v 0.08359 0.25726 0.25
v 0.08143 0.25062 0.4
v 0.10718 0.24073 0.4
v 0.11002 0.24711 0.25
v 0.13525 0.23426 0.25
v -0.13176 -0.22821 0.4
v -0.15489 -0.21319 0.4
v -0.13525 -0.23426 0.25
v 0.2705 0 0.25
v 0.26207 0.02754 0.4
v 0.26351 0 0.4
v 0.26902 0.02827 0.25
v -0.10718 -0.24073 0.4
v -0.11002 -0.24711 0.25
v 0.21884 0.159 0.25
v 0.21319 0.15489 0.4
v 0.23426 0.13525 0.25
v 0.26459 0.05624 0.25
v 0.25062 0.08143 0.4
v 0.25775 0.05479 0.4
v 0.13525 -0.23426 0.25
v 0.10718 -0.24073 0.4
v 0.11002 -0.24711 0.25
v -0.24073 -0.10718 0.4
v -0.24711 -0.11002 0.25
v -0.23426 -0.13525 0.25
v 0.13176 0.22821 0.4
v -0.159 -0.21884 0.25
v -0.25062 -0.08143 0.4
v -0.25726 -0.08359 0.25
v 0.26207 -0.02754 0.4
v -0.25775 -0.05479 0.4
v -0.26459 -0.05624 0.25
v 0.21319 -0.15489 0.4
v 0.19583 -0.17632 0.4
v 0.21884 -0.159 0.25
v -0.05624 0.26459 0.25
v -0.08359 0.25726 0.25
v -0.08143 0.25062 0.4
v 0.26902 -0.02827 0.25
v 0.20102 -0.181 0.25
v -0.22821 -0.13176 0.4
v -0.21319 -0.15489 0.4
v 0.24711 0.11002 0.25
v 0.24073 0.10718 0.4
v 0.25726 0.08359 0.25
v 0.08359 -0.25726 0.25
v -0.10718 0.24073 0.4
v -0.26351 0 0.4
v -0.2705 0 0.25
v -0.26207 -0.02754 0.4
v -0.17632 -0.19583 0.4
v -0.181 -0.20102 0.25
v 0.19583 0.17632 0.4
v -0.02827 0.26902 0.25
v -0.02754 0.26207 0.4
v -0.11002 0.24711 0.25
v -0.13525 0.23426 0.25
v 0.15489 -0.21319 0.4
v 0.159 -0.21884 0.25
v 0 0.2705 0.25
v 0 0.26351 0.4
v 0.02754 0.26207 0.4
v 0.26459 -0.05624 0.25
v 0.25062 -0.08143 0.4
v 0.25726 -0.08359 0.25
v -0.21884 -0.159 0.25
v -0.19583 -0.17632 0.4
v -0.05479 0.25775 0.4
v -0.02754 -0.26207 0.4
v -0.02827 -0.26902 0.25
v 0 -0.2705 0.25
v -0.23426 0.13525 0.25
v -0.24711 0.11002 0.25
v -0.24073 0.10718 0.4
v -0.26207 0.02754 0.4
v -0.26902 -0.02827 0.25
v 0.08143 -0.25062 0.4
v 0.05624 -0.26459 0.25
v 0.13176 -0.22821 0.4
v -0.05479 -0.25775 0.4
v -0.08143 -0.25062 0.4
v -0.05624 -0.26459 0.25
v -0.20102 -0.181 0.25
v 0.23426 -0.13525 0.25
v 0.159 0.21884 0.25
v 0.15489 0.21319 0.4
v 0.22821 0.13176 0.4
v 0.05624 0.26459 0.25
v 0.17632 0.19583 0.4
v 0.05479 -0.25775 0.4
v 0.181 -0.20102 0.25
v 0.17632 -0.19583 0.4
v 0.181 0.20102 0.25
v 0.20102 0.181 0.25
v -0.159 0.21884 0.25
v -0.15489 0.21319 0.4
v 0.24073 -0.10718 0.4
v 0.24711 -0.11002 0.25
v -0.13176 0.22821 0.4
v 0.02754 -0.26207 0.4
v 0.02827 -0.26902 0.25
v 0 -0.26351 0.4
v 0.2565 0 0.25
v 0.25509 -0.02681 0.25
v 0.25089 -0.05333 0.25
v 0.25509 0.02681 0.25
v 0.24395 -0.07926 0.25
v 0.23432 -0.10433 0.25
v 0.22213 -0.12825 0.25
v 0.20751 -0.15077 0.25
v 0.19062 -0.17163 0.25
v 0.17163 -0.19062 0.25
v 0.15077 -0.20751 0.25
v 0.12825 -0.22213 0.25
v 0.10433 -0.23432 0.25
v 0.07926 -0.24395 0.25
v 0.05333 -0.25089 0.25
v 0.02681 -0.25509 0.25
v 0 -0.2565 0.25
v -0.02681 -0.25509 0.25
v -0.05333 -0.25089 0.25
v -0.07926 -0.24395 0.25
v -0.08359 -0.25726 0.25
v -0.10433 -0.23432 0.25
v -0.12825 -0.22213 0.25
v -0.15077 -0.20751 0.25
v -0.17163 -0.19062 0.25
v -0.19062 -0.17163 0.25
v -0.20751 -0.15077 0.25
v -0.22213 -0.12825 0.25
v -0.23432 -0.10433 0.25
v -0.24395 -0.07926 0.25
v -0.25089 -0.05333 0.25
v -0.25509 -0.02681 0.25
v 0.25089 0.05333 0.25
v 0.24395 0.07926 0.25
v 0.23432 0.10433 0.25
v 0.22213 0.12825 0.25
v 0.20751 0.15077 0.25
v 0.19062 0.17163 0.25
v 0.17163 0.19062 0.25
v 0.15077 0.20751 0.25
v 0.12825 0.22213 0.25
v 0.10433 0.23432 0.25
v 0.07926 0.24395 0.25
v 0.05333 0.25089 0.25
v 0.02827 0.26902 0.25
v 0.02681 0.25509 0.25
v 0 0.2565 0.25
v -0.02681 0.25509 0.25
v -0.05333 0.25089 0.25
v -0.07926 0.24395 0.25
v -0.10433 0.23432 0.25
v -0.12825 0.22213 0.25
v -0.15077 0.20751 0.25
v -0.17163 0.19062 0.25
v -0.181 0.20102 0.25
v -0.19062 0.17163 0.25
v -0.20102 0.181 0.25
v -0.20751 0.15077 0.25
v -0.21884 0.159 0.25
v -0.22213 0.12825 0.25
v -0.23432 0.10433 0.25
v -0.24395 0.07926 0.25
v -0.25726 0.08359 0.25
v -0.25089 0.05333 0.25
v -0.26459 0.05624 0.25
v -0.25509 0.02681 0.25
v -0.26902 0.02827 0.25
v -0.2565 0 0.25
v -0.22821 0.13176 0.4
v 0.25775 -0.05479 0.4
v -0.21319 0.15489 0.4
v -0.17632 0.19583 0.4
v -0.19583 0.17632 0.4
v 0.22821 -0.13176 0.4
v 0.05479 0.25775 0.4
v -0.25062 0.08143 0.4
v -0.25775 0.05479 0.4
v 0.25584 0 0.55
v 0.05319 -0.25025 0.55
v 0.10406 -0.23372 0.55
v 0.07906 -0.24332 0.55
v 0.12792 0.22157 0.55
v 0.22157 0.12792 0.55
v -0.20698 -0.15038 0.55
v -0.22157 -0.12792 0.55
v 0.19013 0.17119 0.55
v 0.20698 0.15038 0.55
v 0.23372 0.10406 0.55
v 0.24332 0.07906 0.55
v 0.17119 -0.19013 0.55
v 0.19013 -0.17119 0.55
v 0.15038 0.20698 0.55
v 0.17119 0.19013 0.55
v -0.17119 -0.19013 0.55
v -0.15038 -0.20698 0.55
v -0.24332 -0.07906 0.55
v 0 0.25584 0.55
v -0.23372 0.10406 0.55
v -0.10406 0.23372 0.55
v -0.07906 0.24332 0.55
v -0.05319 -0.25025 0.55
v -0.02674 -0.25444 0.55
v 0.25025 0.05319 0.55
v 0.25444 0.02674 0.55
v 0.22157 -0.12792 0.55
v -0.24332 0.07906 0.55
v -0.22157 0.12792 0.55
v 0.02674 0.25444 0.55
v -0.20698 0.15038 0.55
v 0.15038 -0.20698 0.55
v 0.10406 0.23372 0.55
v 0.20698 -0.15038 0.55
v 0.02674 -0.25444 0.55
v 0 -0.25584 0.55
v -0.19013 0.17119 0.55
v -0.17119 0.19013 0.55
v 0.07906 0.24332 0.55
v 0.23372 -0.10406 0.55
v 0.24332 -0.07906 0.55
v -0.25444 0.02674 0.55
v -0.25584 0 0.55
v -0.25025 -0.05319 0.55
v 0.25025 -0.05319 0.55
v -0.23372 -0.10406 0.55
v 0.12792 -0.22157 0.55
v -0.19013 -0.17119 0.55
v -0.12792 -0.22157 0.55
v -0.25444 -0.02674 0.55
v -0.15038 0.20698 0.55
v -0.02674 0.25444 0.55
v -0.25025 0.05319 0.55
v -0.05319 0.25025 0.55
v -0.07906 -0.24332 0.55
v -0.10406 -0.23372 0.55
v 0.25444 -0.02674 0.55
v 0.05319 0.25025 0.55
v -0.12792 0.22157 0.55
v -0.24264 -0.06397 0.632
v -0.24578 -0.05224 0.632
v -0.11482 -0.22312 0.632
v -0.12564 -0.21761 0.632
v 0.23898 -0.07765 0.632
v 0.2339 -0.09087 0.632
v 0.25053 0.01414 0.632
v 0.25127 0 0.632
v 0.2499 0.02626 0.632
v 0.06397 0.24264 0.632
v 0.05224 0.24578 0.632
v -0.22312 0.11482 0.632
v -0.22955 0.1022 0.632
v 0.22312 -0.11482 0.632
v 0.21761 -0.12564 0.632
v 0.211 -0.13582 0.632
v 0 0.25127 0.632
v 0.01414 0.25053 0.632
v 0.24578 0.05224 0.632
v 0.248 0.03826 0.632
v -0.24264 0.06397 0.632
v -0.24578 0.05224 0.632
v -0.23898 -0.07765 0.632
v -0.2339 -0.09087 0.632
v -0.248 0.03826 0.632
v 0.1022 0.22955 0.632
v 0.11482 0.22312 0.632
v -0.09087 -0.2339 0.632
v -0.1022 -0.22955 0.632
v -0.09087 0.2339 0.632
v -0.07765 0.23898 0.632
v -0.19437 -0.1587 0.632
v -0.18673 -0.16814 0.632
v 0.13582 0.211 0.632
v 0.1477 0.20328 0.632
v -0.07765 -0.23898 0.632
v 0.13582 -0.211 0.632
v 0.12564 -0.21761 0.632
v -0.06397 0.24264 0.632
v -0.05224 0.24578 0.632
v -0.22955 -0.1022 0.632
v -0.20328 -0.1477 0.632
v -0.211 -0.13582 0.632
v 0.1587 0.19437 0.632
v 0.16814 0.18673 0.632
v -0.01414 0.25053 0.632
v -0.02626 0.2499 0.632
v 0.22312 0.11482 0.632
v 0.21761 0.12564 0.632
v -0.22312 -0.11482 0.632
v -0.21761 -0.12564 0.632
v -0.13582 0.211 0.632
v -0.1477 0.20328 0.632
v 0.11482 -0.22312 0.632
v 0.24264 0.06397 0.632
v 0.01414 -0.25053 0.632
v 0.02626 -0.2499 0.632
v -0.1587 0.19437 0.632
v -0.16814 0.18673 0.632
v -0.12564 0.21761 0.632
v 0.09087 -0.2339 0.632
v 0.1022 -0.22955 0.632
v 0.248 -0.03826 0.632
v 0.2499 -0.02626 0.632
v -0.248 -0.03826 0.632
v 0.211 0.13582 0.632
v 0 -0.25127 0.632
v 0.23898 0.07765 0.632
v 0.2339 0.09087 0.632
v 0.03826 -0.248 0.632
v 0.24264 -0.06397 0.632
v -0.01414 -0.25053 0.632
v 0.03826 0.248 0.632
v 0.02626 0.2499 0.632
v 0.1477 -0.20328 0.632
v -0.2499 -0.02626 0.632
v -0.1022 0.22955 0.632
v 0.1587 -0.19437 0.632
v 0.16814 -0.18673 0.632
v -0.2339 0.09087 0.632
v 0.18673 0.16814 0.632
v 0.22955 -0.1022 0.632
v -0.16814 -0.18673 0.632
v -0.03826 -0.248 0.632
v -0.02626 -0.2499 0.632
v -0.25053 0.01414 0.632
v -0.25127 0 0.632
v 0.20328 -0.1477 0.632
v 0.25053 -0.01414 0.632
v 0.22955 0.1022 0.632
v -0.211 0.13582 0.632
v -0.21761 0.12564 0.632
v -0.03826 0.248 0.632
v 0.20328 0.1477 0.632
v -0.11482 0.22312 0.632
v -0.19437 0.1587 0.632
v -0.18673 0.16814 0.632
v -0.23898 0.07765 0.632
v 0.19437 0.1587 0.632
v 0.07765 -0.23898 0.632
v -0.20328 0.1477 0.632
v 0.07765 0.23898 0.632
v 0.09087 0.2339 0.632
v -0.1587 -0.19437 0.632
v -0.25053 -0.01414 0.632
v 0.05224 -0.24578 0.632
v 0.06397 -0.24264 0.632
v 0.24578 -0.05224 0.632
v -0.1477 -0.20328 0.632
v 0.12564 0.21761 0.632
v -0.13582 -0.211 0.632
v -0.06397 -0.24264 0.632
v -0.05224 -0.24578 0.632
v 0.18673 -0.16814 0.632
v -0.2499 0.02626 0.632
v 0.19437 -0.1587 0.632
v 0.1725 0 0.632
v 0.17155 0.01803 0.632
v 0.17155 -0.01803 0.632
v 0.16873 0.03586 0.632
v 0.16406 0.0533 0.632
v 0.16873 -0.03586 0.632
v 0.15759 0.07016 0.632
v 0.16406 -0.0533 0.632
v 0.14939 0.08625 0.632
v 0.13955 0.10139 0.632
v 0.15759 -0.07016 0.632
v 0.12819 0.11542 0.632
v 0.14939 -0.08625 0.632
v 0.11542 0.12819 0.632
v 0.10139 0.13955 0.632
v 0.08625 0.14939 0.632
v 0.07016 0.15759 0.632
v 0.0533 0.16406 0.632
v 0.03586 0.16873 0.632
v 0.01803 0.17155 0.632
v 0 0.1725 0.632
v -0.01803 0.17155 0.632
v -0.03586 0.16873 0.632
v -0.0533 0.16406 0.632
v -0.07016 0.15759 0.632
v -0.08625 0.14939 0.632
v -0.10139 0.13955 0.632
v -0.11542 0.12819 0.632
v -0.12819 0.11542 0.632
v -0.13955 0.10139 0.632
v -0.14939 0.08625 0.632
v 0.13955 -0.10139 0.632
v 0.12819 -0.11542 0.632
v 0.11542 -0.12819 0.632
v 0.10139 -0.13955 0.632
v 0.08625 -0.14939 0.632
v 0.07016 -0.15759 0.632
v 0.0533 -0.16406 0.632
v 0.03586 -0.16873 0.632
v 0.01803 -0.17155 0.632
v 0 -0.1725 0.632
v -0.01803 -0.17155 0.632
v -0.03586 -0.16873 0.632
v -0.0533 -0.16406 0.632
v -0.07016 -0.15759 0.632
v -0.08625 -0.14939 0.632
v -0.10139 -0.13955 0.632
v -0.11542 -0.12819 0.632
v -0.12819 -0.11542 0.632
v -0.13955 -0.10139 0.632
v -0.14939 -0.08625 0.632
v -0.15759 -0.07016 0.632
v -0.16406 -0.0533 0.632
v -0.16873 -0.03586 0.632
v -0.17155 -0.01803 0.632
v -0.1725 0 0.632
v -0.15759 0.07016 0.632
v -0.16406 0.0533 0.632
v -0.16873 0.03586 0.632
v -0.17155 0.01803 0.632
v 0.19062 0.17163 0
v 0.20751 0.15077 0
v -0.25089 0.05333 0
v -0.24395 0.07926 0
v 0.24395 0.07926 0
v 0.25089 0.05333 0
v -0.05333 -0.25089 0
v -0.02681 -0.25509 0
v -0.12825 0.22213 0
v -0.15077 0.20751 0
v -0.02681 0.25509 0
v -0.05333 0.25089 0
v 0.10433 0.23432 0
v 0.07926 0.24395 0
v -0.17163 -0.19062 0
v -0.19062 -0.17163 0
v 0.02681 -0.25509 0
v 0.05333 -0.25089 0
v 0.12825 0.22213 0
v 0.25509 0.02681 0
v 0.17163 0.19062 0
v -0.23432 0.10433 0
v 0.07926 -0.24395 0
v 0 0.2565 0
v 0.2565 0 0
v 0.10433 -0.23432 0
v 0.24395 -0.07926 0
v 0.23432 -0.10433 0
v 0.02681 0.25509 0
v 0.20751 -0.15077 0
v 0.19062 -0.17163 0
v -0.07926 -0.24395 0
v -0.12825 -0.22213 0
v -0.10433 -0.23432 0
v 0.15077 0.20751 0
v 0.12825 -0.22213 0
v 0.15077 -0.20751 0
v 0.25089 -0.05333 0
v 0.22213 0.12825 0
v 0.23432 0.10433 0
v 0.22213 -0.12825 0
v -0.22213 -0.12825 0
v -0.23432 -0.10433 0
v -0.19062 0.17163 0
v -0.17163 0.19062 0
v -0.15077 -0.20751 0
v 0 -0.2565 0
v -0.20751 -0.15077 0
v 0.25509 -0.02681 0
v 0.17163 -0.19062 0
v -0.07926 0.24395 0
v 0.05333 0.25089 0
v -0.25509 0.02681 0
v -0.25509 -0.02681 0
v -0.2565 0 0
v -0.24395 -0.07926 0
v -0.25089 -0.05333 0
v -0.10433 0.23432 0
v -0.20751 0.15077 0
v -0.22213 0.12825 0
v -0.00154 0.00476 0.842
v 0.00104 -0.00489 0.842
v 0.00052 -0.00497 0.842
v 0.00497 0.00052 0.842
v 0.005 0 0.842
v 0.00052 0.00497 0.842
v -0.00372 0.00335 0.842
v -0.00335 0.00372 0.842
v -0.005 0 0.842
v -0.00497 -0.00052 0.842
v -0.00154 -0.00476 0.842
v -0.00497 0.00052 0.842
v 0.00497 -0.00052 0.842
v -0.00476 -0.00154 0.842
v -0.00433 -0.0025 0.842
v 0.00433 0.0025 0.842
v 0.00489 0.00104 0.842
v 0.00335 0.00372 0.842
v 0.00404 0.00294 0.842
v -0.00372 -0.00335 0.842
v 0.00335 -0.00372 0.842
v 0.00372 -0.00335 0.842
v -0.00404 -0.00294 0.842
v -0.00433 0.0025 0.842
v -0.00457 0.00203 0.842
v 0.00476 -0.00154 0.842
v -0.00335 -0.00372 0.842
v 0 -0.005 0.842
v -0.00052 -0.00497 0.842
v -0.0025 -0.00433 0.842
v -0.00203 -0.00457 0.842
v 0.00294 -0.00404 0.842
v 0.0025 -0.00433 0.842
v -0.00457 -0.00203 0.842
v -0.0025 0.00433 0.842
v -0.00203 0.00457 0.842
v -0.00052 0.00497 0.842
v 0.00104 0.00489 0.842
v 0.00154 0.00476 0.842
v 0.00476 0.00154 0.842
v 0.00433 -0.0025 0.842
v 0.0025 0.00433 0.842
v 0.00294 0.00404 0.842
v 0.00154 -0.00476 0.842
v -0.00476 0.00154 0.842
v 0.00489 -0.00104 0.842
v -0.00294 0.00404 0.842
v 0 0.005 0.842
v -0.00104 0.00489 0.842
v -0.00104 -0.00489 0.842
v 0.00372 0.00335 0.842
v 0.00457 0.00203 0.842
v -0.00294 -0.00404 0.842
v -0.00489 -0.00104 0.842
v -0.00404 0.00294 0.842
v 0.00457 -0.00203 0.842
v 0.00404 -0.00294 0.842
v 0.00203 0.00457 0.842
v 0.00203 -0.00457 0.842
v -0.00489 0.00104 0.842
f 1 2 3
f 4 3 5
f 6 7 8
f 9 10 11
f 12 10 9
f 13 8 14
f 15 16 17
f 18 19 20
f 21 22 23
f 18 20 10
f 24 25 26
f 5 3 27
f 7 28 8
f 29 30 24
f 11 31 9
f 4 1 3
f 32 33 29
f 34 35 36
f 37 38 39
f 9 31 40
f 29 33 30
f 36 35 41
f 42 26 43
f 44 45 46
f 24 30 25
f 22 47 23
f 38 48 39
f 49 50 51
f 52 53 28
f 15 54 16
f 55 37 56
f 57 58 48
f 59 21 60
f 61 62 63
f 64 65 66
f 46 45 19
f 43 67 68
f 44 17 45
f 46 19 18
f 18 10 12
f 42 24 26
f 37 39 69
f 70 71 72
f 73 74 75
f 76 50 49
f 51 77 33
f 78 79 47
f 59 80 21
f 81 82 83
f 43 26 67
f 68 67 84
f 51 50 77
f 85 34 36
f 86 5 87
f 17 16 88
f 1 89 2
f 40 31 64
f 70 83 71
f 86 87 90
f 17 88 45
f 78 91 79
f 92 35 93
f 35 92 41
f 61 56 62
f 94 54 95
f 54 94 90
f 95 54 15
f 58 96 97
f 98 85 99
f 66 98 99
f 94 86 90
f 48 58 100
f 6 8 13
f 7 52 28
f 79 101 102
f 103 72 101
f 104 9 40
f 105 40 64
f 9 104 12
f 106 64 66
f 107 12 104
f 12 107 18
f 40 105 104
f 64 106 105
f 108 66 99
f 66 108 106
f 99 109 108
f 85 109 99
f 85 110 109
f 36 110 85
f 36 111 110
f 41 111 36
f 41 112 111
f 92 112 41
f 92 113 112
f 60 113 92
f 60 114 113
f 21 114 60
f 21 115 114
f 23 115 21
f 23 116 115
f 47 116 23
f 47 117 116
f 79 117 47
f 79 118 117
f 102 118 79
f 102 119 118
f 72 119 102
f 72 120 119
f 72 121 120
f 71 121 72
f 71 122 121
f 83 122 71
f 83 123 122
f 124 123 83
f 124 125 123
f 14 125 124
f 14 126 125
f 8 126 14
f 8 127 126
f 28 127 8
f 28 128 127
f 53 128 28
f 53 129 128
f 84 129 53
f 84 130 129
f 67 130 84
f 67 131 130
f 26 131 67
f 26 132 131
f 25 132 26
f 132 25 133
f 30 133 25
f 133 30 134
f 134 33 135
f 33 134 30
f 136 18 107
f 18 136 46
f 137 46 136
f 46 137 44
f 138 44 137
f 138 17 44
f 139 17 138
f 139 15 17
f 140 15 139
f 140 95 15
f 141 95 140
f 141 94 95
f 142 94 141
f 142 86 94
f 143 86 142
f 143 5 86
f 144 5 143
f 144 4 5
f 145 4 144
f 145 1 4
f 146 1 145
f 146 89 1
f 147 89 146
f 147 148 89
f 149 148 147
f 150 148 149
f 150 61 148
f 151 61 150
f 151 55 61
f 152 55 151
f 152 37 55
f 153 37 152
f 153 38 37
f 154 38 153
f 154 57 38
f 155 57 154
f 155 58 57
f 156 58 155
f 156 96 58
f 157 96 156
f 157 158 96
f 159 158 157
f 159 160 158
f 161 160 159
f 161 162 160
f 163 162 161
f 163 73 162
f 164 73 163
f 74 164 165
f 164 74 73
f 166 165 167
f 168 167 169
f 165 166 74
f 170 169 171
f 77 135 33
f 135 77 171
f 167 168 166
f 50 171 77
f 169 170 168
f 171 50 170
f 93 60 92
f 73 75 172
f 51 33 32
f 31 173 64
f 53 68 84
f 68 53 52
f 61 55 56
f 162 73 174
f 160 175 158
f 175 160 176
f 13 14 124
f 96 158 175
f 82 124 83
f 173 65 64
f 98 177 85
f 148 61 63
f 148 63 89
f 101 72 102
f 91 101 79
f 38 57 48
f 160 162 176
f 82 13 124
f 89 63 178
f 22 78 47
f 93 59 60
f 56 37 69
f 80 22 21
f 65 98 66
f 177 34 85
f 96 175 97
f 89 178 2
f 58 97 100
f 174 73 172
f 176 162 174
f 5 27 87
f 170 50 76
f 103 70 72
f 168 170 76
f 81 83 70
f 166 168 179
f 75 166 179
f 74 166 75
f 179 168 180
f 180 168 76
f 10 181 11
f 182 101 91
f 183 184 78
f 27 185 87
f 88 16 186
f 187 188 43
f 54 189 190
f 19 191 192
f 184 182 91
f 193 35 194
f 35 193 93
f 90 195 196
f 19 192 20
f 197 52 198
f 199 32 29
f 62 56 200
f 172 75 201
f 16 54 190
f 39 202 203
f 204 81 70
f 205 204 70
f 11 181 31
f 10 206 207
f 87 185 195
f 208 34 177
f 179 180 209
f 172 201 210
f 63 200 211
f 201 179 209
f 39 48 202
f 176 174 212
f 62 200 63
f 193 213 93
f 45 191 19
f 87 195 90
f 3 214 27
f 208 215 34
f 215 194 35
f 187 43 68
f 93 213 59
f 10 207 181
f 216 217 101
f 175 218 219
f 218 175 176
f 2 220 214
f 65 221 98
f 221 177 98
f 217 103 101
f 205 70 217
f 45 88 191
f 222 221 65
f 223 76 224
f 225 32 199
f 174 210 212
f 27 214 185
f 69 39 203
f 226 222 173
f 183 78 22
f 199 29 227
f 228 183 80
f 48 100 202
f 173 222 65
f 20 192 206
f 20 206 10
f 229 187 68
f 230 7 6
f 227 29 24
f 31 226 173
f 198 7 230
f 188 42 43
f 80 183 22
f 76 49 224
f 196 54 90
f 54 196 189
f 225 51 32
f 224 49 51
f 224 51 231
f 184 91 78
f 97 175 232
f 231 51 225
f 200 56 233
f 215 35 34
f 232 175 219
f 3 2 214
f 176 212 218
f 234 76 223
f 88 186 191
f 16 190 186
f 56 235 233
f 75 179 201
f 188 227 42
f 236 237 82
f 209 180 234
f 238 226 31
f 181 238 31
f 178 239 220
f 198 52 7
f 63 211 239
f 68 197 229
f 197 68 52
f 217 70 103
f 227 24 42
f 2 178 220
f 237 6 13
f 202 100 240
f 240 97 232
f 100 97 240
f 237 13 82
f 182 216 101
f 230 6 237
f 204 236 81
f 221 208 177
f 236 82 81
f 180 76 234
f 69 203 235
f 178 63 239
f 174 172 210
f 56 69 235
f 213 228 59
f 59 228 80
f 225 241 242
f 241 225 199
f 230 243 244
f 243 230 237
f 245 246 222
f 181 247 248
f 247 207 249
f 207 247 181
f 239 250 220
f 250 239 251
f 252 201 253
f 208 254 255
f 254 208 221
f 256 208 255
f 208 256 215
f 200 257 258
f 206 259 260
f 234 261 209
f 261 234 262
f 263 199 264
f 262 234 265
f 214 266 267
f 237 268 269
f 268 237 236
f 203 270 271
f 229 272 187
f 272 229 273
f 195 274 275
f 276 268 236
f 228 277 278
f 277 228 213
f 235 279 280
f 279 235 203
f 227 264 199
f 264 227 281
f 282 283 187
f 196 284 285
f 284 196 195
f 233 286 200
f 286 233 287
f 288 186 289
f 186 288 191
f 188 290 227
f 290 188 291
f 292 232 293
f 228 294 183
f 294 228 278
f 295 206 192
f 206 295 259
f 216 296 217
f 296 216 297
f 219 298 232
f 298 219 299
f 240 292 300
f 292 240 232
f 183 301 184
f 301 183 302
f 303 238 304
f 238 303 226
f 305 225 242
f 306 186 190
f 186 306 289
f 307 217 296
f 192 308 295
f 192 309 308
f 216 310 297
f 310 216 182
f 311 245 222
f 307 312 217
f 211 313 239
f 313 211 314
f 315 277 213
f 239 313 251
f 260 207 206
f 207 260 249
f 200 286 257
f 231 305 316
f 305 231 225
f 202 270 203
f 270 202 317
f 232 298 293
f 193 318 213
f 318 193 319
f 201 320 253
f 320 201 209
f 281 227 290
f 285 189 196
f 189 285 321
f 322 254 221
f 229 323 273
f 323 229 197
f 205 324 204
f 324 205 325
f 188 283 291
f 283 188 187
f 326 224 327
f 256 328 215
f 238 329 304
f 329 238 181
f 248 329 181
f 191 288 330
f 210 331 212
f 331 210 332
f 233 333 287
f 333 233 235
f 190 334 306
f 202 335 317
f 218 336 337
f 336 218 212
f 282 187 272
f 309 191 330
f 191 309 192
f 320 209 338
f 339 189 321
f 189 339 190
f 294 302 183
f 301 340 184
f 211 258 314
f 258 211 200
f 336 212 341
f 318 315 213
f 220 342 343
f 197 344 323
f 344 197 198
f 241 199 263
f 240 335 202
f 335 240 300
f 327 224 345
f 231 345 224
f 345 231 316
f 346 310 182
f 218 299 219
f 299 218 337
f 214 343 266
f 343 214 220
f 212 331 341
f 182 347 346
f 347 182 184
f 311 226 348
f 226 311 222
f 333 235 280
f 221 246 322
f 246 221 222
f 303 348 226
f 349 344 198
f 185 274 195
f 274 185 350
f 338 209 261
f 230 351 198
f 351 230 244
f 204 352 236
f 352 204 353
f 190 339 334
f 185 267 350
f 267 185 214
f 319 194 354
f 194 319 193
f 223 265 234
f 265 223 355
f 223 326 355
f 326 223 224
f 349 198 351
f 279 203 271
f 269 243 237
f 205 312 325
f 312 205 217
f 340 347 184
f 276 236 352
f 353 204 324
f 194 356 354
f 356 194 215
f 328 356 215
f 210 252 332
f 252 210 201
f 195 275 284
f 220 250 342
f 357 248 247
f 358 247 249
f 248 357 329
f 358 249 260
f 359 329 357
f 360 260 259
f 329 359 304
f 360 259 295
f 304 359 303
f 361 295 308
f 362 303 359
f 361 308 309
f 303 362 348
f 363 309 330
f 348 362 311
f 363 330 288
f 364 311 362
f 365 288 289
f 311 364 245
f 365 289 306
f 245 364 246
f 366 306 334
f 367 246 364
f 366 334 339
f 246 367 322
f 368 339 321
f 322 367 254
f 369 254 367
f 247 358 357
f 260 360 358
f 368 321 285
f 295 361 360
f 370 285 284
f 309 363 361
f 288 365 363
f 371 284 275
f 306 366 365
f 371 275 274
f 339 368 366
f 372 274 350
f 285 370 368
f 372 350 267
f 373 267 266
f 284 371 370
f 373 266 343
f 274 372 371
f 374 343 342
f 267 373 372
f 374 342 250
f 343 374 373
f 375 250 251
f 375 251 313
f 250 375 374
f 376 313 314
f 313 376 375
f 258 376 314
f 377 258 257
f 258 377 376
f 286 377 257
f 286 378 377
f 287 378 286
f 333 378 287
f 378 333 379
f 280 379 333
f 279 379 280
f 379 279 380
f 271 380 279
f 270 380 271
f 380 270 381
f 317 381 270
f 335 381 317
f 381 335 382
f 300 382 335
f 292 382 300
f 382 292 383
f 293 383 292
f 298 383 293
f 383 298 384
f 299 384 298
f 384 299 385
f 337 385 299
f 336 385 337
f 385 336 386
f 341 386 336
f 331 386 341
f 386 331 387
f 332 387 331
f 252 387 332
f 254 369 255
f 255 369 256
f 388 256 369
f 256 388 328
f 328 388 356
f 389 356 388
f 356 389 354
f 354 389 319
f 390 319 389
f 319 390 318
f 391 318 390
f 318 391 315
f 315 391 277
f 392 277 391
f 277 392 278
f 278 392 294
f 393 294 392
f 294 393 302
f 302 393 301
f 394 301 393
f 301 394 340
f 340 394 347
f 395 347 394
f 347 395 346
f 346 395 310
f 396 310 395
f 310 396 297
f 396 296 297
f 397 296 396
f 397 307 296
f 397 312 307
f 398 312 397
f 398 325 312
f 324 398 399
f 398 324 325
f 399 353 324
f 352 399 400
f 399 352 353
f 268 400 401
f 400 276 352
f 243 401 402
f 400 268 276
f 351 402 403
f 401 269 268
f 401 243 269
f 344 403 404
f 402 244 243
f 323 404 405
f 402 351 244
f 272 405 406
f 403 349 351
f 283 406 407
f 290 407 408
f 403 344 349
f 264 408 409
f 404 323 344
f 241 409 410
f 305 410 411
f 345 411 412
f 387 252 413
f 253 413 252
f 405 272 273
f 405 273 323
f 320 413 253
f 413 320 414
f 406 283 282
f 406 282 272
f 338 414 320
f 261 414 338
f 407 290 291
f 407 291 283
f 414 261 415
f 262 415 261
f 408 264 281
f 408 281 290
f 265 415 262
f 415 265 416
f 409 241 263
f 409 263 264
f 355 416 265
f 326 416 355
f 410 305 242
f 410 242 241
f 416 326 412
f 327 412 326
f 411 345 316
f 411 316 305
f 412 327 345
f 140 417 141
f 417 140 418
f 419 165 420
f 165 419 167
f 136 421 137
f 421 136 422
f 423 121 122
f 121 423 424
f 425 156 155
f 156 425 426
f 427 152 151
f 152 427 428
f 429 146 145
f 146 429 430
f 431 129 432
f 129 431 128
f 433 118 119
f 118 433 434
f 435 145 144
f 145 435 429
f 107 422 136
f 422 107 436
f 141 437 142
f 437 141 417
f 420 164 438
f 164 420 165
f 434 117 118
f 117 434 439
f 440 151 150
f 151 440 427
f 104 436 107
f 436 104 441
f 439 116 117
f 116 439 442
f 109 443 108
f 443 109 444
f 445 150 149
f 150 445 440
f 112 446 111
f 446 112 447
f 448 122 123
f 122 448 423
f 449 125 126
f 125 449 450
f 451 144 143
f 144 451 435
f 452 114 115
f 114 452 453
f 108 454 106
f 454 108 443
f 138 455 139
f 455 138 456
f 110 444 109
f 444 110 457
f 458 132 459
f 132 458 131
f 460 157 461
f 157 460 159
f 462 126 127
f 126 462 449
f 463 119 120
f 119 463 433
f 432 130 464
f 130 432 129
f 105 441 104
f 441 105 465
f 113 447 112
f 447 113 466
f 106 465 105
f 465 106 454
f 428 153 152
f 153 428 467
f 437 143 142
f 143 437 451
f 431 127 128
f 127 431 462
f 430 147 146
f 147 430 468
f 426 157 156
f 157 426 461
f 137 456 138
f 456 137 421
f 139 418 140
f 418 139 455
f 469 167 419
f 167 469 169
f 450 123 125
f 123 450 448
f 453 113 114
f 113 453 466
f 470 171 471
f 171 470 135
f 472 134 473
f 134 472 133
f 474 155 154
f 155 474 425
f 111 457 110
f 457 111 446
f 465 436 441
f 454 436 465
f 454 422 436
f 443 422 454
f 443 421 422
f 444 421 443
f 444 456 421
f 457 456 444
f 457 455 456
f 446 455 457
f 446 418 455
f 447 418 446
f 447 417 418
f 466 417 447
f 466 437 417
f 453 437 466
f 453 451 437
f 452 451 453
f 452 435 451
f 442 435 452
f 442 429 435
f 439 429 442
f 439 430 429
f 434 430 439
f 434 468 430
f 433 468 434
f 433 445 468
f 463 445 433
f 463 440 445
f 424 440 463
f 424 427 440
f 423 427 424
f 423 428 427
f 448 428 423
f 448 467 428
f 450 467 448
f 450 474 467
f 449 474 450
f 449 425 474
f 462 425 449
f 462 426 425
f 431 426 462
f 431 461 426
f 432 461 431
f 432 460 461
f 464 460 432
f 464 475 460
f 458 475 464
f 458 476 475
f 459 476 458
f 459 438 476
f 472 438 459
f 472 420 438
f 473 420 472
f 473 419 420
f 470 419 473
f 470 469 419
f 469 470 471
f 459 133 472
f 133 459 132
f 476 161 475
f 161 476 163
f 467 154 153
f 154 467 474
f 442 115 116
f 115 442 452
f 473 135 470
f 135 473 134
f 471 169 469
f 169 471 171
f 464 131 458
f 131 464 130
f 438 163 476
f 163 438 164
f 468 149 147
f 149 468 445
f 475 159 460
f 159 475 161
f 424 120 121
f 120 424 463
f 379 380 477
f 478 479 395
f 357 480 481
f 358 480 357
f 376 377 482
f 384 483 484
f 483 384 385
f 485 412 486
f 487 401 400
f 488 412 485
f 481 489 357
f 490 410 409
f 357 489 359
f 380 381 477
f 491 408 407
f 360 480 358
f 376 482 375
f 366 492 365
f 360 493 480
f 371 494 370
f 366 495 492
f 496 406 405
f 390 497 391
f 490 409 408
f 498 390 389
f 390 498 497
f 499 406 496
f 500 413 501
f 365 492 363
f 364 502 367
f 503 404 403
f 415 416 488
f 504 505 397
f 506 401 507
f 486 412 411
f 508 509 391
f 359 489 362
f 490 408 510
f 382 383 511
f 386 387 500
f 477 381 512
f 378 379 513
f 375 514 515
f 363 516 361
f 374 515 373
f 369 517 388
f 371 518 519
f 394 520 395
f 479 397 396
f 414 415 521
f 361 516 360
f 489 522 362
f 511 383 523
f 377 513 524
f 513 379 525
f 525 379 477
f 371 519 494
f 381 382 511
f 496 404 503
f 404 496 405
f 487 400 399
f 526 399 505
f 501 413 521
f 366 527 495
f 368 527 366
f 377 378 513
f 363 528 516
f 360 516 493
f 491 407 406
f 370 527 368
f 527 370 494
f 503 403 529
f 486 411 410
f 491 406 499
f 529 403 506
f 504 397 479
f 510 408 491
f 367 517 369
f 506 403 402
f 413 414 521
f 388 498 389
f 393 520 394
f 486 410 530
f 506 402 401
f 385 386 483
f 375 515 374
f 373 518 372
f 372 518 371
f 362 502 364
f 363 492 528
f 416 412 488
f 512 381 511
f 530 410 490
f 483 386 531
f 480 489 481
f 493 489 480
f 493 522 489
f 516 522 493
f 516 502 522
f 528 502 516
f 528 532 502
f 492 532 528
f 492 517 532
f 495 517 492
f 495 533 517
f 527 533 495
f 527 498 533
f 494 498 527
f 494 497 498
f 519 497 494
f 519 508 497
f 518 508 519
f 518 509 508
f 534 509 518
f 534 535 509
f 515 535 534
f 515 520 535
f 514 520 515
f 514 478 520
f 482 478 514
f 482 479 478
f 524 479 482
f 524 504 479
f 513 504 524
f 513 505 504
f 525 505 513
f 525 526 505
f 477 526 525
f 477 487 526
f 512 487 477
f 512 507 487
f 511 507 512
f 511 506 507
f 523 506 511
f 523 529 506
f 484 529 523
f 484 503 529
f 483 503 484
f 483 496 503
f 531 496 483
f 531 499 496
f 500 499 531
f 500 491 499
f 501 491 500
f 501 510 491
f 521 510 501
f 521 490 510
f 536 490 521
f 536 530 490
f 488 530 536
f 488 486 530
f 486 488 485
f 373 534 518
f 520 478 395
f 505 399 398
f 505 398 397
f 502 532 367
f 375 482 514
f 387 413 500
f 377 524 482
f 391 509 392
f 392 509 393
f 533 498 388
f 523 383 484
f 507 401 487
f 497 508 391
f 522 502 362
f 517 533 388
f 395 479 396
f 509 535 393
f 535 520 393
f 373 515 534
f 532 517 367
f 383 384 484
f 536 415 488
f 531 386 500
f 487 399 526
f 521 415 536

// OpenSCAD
//------------------------------------------------------------------
// Create by Robert F. Nee.  Use freely.
//
// See http://en.wikipedia.org/wiki/Nose_cone_design#Secant_ogive for more info
//
// Estes PNC-5BA (Mini Bomarc, Mars Snooper etc.)
//
//------------------------------------------------------------------

//------------------------------------------------------------------
// Compute y for a given x for a secant ogive in 2D space.
// a - alpha
// p - phi
// x - distance from base of form (not including shoulder)
// returns y which is the radius of the cone at that point

function sec_ogive_y (a, p, x) =
	max(sqrt (p * p - pow (p * cos (a) - x, 2)) + p * sin (a), 0); 

//------------------------------------------------------------------
// Draw a secant ogive cone of given dimensions
// height		- height of cone not including shoulder
// diameter	- diameter at base of cone
// phi		- radius of circle that defines the curve of the cone 
// slice		- number of slices that make up the cone

module sec_ogive (height, diameter, phi, slice)
{
	// height of each slice
	step = height/slice;

	// radius of base of cone
	base_r = diameter/2;

	// alpha (see web page above)
	alpha = atan (base_r/height) - 
			acos (sqrt (height*height + base_r*base_r)/(2*phi));

//echo (alpha, phi, h2, 2*sec_ogive_y (alpha, phi, height - h2) );

	// generate slices as a series of truncated cones
	for (i = [1 : slice]) {
		// x is location of base of slice
		assign (x = (i - 1) * step) {
			// position slice
			translate ( [0, 0, x] )
			// draw slice (truncated cone)
			cylinder (
				step,
				sec_ogive_y (alpha, phi, height - x),
				sec_ogive_y (alpha, phi, height - x - step)
			);
		}
	}
}

// BT5	0.515
// BT20	0.736

//------------------------------------------------------------------
// Parameter definitions for Estes PNC-5BA.  Tweak these for different shapes.
// The value of phi was determined empirically and may not be 100 accurate
// It looks OK to my eye.  It you have better info please share it.
// The cone is composited out of a clipped secant ogive topped by an inset
// cone.

					// Dimension are in inches
$fn = 60; 			// Number of fragments used to generate circles
h1 = 3.0;			// Height of ogive
h2 = 0.382;			// Clipping height
cd = 0.345;			// Topping cone base diameter
ch = 0.210;			// Topping cone height
od = 0.541;			// OD of base of cone in inches
id = 0.515 - 0.002;		// ID of BT-55 plus some room for shoulder
phi = 33;				// radius of circle defining curve
sh = 0.25;				// Height of shoulder in inches

// shoulder
cylinder (h=sh, d=id);

// Clipped ogive
translate ([0, 0, sh])
difference () {
	sec_ogive (h1, od, phi, 20);
	translate ([0, 0, h2])
		cylinder (h=h1, d=od);
}

// Topping cone
translate ([0, 0, sh + h2])
	cylinder (h=ch, d1=cd, d2=0.01);
